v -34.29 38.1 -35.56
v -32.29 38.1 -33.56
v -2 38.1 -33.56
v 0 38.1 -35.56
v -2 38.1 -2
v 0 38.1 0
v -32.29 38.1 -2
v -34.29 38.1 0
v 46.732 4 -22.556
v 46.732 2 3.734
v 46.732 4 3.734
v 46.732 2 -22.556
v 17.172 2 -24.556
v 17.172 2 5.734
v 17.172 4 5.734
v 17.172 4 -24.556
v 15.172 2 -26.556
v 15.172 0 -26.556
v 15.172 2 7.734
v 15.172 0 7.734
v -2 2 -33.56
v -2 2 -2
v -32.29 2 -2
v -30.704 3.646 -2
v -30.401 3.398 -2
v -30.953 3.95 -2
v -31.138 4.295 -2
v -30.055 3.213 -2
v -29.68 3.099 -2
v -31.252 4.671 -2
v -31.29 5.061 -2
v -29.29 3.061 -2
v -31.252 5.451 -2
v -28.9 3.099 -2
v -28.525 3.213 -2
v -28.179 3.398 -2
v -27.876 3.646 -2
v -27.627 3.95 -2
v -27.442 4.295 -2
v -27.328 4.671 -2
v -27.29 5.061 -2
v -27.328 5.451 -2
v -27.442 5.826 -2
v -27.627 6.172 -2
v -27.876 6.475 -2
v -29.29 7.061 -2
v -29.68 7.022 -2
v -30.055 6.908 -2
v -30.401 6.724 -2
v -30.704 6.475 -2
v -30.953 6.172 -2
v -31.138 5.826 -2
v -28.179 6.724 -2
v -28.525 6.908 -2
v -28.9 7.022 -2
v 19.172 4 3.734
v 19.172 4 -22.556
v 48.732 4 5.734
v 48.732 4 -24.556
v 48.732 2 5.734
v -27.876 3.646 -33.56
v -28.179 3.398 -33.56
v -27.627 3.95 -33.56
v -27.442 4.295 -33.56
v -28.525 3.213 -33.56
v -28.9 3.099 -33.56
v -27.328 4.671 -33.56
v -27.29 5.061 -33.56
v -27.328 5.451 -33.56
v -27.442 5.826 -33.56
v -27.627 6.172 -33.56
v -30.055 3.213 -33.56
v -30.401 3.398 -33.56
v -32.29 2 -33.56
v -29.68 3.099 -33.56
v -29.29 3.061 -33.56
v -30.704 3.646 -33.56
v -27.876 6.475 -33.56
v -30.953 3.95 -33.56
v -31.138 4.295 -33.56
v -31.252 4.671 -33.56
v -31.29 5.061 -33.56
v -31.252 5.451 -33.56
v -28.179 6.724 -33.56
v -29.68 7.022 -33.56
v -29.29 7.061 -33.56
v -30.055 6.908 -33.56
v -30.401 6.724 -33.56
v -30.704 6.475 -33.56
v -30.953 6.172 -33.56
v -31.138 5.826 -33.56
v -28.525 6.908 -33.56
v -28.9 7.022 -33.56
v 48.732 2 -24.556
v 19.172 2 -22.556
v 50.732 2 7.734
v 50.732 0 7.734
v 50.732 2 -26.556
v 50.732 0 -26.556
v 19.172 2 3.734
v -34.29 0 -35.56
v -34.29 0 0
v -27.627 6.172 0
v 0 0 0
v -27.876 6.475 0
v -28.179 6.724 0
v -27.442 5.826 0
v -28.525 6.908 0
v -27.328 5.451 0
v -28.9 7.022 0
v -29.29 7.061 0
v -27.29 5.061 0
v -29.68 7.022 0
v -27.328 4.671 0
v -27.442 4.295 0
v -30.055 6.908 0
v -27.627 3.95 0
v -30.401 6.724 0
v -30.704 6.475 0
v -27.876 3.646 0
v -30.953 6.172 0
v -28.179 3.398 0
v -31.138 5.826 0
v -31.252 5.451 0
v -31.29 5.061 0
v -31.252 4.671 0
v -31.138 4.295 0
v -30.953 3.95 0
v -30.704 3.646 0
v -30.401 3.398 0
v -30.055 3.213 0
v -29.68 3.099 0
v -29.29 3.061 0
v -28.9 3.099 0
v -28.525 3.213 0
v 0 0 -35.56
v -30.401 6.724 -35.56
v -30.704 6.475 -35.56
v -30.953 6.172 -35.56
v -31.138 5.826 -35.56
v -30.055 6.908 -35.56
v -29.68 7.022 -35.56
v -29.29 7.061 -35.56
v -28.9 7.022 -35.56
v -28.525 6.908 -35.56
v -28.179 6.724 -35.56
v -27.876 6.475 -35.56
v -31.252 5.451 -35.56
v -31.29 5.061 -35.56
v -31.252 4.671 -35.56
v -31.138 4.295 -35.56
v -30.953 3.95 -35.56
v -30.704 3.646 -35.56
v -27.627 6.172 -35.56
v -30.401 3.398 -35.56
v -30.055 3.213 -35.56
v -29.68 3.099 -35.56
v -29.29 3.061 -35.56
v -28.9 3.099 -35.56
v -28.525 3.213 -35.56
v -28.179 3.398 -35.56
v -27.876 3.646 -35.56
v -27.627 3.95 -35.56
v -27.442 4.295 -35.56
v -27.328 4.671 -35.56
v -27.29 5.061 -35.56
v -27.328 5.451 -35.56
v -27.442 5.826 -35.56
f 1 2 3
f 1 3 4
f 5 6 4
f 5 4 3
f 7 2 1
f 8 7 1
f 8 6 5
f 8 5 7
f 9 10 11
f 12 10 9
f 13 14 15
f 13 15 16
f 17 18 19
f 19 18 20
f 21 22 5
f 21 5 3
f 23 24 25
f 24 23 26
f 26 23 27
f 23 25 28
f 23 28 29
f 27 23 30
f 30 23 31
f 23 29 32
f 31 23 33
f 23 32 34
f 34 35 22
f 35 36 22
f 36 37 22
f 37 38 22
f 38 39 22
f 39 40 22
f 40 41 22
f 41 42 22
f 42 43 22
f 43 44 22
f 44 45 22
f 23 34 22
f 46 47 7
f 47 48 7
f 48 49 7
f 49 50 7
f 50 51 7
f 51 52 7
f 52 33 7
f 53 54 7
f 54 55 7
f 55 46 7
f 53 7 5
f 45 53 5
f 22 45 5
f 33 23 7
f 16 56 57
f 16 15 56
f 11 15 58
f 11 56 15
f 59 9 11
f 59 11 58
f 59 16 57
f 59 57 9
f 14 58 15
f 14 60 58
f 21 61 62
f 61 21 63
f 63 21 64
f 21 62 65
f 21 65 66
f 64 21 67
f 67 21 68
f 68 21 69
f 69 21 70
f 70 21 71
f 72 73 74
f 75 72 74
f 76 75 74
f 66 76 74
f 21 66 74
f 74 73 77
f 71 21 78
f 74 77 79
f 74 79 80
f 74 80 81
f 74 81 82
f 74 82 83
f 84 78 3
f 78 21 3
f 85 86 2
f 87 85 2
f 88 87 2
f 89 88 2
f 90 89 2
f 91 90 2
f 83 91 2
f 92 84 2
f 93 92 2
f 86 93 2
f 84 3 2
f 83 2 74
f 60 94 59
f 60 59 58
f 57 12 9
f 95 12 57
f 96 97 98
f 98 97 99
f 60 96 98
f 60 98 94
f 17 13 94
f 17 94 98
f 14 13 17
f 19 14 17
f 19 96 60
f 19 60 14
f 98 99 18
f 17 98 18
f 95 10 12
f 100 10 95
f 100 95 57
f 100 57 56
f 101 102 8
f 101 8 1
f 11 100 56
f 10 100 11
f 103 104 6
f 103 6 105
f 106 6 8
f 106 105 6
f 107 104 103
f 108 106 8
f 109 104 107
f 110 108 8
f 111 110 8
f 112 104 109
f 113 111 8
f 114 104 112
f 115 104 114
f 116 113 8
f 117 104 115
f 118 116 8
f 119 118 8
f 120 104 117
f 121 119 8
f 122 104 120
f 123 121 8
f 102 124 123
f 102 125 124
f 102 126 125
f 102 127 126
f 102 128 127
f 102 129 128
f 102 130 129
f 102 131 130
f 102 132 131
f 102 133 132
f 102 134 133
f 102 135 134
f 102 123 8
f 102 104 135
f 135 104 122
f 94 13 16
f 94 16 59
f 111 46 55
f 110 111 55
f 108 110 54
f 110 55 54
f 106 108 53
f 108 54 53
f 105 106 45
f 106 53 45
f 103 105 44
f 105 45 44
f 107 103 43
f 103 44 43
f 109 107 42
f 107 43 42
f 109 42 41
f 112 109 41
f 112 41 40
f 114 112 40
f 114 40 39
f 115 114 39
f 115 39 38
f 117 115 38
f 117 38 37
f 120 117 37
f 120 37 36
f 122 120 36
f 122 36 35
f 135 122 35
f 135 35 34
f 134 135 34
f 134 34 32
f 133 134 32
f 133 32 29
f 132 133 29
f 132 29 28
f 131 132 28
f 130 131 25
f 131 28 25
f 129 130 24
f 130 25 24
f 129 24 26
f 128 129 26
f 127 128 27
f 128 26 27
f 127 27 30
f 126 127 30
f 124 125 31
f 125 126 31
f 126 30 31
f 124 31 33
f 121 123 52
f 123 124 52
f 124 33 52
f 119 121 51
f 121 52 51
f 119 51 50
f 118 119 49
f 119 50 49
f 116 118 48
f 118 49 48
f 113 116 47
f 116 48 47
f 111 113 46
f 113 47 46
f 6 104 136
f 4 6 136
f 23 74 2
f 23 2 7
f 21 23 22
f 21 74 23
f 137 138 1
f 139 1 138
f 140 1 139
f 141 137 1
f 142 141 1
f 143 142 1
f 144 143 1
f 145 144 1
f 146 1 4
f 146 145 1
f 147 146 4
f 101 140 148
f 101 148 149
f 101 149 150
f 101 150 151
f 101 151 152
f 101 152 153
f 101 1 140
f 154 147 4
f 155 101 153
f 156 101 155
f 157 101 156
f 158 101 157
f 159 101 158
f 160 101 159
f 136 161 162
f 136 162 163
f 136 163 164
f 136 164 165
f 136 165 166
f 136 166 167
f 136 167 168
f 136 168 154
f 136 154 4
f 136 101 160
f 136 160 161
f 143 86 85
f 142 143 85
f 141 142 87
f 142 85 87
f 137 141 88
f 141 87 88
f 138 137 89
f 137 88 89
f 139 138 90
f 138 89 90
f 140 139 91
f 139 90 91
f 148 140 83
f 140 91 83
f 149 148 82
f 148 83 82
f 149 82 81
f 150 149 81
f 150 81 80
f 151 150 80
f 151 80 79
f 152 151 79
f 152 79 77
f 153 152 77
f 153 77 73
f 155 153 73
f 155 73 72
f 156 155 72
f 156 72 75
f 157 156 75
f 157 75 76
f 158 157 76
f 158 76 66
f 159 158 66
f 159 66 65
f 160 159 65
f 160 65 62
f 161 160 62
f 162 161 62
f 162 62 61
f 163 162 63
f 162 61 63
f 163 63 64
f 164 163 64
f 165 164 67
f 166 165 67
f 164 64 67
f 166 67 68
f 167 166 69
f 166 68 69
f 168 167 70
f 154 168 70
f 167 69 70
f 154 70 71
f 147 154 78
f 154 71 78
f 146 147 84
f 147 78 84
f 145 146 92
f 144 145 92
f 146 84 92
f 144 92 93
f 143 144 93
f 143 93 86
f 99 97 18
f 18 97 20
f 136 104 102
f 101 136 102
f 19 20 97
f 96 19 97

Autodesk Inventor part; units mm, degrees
ref_plane "YZ Plane" through (0, 0, 0) normal (1, 0, 0) x (0, 1, 0)
ref_plane "XZ Plane" through (0, 0, 0) normal (0, 1, 0) x (-1, 0, 0)
ref_plane "XY Plane" through (0, 0, 0) normal (0, 0, 1) x (1, 0, 0)
sketch "Sketch1" plane through (0, 0, 0) normal (0, 1, 0) x (-1, 0, 0)
  line L0 (0, 0) -> (34.29, 0)
  line L1 (0, 0) -> (0, -35.56)
  line L2 (0, 0) -> (34.29, 0)
  line L3 (34.29, 0) -> (34.29, -35.56)
  line L4 (34.29, -35.56) -> (0, -35.56)
  line L5 (0, -35.56) -> (0, 0)
  dimension "d0" = 34.29
  dimension "d1" = 35.56
extrude "Extrusion1" add sketch "Sketch1" along normal blind 38.1
sketch "Sketch2" plane through (0, 38.1, 0) normal (0, 1, 0) x (1, 0, 0)
  line L0 (-34.29, 35.56) -> (-34.29, 0) projected
  line L1 (-34.29, 0) -> (0, 0) projected
  line L2 (0, 0) -> (0, 35.56) projected
  line L3 (0, 35.56) -> (-34.29, 35.56) projected
  line L4 (-32.29, 33.56) -> (-32.29, 2)
  line L5 (-32.29, 2) -> (-2, 2)
  line L6 (-2, 2) -> (-2, 33.56)
  line L7 (-2, 33.56) -> (-32.29, 33.56)
  dimension "d4" = 2
extrude "Extrusion2" cut sketch "Sketch2" against normal blind 36.1 contours L7 L6 L5 L4
sketch "Sketch3" plane through (0, 0, -35.56) normal (0, 0, -1) x (-1, 0, 0)
  line L0 (0, 0) -> (34.29, 0) projected
  line L1 (34.29, 0) -> (34.29, 38.1) projected
  line L2 (0, 38.1) -> (34.29, 38.1) projected
  line L3 (0, 0) -> (0, 38.1) projected
  line L4 (34.29, 0) -> (34.29, 38.1) projected
  line L5 (34.29, 0) -> (29.29, 0)
  line L6 (0, 0) -> (34.29, 0) projected
  line L7 (29.29, 0) -> (29.29, 5.0607)
  line L8 (2, 38.1) -> (32.29, 38.1) projected
  line L9 (2, 38.1) -> (2, 2) projected
  line L10 (2, 2) -> (32.29, 2) projected
  line L11 (32.29, 38.1) -> (32.29, 2) projected
  line L12 (32.29, 38.1) -> (32.29, 2) projected
  dimension "d7" = 5
  dimension "d8" = 5.0607
hole "Hole1" at (-29.29, 5.0607, -35.56) direction (0, 0, 1) diameter 4 depth 2
ref_plane "Work Plane1" through (-2, 38.1, -17.78) normal (0, 0, -1) x (-1, 0, 0)
mirror "Mirror1" about plane through (-2, 38.1, -17.78) normal (0, 0, -1) of "Hole1"
sketch "Sketch4" plane through (0, 0, 0) normal (0, 1, 0) x (-1, 0, 0)
  line L0 (32.29, -33.56) -> (2, -33.56) projected
  line L1 (2, -33.56) -> (2, -2) projected
  line L2 (2, -2) -> (32.29, -2) projected
  line L3 (32.29, -2) -> (32.29, -33.56) projected
  line L4 (34.29, -35.56) -> (34.29, 0) projected
  line L5 (34.29, 0) -> (0, 0) projected
  line L6 (0, 0) -> (0, -35.56) projected
  line L7 (0, -35.56) -> (34.29, -35.56) projected
  line L8 (-15.1723, 7.7342) -> (-50.7323, 7.7342)
  line L9 (-50.7323, 7.7342) -> (-50.7323, -26.5558)
  line L10 (-50.7323, -26.5558) -> (-15.1723, -26.5558)
  line L11 (-15.1723, -26.5558) -> (-15.1723, 7.7342)
  dimension "d17" = 35.56
  dimension "d18" = 34.29
extrude "Extrusion3" add sketch "Sketch4" along normal blind 2 contours L11 L10 L9 L8
sketch "Sketch5" plane through (0, 2, 0) normal (0, 1, 0) x (1, 0, 0)
  line L0 (50.7323, -7.7342) -> (50.7323, 26.5558) projected
  line L1 (50.7323, 26.5558) -> (15.1723, 26.5558) projected
  line L2 (15.1723, 26.5558) -> (15.1723, -7.7342) projected
  line L3 (15.1723, -7.7342) -> (50.7323, -7.7342) projected
  line L4 (17.1723, 24.5558) -> (48.7323, 24.5558)
  line L5 (48.7323, 24.5558) -> (48.7323, -5.7342)
  line L6 (48.7323, -5.7342) -> (17.1723, -5.7342)
  line L7 (17.1723, -5.7342) -> (17.1723, 24.5558)
  line L8 (46.7323, 22.5558) -> (19.1723, 22.5558)
  line L9 (19.1723, 22.5558) -> (19.1723, -3.7342)
  line L10 (19.1723, -3.7342) -> (46.7323, -3.7342)
  line L11 (46.7323, -3.7342) -> (46.7323, 22.5558)
  point P0 (0, 0)
  dimension "d21" = 2
  dimension "d22" = 2
extrude "Extrusion4" add sketch "Sketch5" along normal blind 2 contours L4 L5 L6 L7
properties part number "waterBallonHolder"
